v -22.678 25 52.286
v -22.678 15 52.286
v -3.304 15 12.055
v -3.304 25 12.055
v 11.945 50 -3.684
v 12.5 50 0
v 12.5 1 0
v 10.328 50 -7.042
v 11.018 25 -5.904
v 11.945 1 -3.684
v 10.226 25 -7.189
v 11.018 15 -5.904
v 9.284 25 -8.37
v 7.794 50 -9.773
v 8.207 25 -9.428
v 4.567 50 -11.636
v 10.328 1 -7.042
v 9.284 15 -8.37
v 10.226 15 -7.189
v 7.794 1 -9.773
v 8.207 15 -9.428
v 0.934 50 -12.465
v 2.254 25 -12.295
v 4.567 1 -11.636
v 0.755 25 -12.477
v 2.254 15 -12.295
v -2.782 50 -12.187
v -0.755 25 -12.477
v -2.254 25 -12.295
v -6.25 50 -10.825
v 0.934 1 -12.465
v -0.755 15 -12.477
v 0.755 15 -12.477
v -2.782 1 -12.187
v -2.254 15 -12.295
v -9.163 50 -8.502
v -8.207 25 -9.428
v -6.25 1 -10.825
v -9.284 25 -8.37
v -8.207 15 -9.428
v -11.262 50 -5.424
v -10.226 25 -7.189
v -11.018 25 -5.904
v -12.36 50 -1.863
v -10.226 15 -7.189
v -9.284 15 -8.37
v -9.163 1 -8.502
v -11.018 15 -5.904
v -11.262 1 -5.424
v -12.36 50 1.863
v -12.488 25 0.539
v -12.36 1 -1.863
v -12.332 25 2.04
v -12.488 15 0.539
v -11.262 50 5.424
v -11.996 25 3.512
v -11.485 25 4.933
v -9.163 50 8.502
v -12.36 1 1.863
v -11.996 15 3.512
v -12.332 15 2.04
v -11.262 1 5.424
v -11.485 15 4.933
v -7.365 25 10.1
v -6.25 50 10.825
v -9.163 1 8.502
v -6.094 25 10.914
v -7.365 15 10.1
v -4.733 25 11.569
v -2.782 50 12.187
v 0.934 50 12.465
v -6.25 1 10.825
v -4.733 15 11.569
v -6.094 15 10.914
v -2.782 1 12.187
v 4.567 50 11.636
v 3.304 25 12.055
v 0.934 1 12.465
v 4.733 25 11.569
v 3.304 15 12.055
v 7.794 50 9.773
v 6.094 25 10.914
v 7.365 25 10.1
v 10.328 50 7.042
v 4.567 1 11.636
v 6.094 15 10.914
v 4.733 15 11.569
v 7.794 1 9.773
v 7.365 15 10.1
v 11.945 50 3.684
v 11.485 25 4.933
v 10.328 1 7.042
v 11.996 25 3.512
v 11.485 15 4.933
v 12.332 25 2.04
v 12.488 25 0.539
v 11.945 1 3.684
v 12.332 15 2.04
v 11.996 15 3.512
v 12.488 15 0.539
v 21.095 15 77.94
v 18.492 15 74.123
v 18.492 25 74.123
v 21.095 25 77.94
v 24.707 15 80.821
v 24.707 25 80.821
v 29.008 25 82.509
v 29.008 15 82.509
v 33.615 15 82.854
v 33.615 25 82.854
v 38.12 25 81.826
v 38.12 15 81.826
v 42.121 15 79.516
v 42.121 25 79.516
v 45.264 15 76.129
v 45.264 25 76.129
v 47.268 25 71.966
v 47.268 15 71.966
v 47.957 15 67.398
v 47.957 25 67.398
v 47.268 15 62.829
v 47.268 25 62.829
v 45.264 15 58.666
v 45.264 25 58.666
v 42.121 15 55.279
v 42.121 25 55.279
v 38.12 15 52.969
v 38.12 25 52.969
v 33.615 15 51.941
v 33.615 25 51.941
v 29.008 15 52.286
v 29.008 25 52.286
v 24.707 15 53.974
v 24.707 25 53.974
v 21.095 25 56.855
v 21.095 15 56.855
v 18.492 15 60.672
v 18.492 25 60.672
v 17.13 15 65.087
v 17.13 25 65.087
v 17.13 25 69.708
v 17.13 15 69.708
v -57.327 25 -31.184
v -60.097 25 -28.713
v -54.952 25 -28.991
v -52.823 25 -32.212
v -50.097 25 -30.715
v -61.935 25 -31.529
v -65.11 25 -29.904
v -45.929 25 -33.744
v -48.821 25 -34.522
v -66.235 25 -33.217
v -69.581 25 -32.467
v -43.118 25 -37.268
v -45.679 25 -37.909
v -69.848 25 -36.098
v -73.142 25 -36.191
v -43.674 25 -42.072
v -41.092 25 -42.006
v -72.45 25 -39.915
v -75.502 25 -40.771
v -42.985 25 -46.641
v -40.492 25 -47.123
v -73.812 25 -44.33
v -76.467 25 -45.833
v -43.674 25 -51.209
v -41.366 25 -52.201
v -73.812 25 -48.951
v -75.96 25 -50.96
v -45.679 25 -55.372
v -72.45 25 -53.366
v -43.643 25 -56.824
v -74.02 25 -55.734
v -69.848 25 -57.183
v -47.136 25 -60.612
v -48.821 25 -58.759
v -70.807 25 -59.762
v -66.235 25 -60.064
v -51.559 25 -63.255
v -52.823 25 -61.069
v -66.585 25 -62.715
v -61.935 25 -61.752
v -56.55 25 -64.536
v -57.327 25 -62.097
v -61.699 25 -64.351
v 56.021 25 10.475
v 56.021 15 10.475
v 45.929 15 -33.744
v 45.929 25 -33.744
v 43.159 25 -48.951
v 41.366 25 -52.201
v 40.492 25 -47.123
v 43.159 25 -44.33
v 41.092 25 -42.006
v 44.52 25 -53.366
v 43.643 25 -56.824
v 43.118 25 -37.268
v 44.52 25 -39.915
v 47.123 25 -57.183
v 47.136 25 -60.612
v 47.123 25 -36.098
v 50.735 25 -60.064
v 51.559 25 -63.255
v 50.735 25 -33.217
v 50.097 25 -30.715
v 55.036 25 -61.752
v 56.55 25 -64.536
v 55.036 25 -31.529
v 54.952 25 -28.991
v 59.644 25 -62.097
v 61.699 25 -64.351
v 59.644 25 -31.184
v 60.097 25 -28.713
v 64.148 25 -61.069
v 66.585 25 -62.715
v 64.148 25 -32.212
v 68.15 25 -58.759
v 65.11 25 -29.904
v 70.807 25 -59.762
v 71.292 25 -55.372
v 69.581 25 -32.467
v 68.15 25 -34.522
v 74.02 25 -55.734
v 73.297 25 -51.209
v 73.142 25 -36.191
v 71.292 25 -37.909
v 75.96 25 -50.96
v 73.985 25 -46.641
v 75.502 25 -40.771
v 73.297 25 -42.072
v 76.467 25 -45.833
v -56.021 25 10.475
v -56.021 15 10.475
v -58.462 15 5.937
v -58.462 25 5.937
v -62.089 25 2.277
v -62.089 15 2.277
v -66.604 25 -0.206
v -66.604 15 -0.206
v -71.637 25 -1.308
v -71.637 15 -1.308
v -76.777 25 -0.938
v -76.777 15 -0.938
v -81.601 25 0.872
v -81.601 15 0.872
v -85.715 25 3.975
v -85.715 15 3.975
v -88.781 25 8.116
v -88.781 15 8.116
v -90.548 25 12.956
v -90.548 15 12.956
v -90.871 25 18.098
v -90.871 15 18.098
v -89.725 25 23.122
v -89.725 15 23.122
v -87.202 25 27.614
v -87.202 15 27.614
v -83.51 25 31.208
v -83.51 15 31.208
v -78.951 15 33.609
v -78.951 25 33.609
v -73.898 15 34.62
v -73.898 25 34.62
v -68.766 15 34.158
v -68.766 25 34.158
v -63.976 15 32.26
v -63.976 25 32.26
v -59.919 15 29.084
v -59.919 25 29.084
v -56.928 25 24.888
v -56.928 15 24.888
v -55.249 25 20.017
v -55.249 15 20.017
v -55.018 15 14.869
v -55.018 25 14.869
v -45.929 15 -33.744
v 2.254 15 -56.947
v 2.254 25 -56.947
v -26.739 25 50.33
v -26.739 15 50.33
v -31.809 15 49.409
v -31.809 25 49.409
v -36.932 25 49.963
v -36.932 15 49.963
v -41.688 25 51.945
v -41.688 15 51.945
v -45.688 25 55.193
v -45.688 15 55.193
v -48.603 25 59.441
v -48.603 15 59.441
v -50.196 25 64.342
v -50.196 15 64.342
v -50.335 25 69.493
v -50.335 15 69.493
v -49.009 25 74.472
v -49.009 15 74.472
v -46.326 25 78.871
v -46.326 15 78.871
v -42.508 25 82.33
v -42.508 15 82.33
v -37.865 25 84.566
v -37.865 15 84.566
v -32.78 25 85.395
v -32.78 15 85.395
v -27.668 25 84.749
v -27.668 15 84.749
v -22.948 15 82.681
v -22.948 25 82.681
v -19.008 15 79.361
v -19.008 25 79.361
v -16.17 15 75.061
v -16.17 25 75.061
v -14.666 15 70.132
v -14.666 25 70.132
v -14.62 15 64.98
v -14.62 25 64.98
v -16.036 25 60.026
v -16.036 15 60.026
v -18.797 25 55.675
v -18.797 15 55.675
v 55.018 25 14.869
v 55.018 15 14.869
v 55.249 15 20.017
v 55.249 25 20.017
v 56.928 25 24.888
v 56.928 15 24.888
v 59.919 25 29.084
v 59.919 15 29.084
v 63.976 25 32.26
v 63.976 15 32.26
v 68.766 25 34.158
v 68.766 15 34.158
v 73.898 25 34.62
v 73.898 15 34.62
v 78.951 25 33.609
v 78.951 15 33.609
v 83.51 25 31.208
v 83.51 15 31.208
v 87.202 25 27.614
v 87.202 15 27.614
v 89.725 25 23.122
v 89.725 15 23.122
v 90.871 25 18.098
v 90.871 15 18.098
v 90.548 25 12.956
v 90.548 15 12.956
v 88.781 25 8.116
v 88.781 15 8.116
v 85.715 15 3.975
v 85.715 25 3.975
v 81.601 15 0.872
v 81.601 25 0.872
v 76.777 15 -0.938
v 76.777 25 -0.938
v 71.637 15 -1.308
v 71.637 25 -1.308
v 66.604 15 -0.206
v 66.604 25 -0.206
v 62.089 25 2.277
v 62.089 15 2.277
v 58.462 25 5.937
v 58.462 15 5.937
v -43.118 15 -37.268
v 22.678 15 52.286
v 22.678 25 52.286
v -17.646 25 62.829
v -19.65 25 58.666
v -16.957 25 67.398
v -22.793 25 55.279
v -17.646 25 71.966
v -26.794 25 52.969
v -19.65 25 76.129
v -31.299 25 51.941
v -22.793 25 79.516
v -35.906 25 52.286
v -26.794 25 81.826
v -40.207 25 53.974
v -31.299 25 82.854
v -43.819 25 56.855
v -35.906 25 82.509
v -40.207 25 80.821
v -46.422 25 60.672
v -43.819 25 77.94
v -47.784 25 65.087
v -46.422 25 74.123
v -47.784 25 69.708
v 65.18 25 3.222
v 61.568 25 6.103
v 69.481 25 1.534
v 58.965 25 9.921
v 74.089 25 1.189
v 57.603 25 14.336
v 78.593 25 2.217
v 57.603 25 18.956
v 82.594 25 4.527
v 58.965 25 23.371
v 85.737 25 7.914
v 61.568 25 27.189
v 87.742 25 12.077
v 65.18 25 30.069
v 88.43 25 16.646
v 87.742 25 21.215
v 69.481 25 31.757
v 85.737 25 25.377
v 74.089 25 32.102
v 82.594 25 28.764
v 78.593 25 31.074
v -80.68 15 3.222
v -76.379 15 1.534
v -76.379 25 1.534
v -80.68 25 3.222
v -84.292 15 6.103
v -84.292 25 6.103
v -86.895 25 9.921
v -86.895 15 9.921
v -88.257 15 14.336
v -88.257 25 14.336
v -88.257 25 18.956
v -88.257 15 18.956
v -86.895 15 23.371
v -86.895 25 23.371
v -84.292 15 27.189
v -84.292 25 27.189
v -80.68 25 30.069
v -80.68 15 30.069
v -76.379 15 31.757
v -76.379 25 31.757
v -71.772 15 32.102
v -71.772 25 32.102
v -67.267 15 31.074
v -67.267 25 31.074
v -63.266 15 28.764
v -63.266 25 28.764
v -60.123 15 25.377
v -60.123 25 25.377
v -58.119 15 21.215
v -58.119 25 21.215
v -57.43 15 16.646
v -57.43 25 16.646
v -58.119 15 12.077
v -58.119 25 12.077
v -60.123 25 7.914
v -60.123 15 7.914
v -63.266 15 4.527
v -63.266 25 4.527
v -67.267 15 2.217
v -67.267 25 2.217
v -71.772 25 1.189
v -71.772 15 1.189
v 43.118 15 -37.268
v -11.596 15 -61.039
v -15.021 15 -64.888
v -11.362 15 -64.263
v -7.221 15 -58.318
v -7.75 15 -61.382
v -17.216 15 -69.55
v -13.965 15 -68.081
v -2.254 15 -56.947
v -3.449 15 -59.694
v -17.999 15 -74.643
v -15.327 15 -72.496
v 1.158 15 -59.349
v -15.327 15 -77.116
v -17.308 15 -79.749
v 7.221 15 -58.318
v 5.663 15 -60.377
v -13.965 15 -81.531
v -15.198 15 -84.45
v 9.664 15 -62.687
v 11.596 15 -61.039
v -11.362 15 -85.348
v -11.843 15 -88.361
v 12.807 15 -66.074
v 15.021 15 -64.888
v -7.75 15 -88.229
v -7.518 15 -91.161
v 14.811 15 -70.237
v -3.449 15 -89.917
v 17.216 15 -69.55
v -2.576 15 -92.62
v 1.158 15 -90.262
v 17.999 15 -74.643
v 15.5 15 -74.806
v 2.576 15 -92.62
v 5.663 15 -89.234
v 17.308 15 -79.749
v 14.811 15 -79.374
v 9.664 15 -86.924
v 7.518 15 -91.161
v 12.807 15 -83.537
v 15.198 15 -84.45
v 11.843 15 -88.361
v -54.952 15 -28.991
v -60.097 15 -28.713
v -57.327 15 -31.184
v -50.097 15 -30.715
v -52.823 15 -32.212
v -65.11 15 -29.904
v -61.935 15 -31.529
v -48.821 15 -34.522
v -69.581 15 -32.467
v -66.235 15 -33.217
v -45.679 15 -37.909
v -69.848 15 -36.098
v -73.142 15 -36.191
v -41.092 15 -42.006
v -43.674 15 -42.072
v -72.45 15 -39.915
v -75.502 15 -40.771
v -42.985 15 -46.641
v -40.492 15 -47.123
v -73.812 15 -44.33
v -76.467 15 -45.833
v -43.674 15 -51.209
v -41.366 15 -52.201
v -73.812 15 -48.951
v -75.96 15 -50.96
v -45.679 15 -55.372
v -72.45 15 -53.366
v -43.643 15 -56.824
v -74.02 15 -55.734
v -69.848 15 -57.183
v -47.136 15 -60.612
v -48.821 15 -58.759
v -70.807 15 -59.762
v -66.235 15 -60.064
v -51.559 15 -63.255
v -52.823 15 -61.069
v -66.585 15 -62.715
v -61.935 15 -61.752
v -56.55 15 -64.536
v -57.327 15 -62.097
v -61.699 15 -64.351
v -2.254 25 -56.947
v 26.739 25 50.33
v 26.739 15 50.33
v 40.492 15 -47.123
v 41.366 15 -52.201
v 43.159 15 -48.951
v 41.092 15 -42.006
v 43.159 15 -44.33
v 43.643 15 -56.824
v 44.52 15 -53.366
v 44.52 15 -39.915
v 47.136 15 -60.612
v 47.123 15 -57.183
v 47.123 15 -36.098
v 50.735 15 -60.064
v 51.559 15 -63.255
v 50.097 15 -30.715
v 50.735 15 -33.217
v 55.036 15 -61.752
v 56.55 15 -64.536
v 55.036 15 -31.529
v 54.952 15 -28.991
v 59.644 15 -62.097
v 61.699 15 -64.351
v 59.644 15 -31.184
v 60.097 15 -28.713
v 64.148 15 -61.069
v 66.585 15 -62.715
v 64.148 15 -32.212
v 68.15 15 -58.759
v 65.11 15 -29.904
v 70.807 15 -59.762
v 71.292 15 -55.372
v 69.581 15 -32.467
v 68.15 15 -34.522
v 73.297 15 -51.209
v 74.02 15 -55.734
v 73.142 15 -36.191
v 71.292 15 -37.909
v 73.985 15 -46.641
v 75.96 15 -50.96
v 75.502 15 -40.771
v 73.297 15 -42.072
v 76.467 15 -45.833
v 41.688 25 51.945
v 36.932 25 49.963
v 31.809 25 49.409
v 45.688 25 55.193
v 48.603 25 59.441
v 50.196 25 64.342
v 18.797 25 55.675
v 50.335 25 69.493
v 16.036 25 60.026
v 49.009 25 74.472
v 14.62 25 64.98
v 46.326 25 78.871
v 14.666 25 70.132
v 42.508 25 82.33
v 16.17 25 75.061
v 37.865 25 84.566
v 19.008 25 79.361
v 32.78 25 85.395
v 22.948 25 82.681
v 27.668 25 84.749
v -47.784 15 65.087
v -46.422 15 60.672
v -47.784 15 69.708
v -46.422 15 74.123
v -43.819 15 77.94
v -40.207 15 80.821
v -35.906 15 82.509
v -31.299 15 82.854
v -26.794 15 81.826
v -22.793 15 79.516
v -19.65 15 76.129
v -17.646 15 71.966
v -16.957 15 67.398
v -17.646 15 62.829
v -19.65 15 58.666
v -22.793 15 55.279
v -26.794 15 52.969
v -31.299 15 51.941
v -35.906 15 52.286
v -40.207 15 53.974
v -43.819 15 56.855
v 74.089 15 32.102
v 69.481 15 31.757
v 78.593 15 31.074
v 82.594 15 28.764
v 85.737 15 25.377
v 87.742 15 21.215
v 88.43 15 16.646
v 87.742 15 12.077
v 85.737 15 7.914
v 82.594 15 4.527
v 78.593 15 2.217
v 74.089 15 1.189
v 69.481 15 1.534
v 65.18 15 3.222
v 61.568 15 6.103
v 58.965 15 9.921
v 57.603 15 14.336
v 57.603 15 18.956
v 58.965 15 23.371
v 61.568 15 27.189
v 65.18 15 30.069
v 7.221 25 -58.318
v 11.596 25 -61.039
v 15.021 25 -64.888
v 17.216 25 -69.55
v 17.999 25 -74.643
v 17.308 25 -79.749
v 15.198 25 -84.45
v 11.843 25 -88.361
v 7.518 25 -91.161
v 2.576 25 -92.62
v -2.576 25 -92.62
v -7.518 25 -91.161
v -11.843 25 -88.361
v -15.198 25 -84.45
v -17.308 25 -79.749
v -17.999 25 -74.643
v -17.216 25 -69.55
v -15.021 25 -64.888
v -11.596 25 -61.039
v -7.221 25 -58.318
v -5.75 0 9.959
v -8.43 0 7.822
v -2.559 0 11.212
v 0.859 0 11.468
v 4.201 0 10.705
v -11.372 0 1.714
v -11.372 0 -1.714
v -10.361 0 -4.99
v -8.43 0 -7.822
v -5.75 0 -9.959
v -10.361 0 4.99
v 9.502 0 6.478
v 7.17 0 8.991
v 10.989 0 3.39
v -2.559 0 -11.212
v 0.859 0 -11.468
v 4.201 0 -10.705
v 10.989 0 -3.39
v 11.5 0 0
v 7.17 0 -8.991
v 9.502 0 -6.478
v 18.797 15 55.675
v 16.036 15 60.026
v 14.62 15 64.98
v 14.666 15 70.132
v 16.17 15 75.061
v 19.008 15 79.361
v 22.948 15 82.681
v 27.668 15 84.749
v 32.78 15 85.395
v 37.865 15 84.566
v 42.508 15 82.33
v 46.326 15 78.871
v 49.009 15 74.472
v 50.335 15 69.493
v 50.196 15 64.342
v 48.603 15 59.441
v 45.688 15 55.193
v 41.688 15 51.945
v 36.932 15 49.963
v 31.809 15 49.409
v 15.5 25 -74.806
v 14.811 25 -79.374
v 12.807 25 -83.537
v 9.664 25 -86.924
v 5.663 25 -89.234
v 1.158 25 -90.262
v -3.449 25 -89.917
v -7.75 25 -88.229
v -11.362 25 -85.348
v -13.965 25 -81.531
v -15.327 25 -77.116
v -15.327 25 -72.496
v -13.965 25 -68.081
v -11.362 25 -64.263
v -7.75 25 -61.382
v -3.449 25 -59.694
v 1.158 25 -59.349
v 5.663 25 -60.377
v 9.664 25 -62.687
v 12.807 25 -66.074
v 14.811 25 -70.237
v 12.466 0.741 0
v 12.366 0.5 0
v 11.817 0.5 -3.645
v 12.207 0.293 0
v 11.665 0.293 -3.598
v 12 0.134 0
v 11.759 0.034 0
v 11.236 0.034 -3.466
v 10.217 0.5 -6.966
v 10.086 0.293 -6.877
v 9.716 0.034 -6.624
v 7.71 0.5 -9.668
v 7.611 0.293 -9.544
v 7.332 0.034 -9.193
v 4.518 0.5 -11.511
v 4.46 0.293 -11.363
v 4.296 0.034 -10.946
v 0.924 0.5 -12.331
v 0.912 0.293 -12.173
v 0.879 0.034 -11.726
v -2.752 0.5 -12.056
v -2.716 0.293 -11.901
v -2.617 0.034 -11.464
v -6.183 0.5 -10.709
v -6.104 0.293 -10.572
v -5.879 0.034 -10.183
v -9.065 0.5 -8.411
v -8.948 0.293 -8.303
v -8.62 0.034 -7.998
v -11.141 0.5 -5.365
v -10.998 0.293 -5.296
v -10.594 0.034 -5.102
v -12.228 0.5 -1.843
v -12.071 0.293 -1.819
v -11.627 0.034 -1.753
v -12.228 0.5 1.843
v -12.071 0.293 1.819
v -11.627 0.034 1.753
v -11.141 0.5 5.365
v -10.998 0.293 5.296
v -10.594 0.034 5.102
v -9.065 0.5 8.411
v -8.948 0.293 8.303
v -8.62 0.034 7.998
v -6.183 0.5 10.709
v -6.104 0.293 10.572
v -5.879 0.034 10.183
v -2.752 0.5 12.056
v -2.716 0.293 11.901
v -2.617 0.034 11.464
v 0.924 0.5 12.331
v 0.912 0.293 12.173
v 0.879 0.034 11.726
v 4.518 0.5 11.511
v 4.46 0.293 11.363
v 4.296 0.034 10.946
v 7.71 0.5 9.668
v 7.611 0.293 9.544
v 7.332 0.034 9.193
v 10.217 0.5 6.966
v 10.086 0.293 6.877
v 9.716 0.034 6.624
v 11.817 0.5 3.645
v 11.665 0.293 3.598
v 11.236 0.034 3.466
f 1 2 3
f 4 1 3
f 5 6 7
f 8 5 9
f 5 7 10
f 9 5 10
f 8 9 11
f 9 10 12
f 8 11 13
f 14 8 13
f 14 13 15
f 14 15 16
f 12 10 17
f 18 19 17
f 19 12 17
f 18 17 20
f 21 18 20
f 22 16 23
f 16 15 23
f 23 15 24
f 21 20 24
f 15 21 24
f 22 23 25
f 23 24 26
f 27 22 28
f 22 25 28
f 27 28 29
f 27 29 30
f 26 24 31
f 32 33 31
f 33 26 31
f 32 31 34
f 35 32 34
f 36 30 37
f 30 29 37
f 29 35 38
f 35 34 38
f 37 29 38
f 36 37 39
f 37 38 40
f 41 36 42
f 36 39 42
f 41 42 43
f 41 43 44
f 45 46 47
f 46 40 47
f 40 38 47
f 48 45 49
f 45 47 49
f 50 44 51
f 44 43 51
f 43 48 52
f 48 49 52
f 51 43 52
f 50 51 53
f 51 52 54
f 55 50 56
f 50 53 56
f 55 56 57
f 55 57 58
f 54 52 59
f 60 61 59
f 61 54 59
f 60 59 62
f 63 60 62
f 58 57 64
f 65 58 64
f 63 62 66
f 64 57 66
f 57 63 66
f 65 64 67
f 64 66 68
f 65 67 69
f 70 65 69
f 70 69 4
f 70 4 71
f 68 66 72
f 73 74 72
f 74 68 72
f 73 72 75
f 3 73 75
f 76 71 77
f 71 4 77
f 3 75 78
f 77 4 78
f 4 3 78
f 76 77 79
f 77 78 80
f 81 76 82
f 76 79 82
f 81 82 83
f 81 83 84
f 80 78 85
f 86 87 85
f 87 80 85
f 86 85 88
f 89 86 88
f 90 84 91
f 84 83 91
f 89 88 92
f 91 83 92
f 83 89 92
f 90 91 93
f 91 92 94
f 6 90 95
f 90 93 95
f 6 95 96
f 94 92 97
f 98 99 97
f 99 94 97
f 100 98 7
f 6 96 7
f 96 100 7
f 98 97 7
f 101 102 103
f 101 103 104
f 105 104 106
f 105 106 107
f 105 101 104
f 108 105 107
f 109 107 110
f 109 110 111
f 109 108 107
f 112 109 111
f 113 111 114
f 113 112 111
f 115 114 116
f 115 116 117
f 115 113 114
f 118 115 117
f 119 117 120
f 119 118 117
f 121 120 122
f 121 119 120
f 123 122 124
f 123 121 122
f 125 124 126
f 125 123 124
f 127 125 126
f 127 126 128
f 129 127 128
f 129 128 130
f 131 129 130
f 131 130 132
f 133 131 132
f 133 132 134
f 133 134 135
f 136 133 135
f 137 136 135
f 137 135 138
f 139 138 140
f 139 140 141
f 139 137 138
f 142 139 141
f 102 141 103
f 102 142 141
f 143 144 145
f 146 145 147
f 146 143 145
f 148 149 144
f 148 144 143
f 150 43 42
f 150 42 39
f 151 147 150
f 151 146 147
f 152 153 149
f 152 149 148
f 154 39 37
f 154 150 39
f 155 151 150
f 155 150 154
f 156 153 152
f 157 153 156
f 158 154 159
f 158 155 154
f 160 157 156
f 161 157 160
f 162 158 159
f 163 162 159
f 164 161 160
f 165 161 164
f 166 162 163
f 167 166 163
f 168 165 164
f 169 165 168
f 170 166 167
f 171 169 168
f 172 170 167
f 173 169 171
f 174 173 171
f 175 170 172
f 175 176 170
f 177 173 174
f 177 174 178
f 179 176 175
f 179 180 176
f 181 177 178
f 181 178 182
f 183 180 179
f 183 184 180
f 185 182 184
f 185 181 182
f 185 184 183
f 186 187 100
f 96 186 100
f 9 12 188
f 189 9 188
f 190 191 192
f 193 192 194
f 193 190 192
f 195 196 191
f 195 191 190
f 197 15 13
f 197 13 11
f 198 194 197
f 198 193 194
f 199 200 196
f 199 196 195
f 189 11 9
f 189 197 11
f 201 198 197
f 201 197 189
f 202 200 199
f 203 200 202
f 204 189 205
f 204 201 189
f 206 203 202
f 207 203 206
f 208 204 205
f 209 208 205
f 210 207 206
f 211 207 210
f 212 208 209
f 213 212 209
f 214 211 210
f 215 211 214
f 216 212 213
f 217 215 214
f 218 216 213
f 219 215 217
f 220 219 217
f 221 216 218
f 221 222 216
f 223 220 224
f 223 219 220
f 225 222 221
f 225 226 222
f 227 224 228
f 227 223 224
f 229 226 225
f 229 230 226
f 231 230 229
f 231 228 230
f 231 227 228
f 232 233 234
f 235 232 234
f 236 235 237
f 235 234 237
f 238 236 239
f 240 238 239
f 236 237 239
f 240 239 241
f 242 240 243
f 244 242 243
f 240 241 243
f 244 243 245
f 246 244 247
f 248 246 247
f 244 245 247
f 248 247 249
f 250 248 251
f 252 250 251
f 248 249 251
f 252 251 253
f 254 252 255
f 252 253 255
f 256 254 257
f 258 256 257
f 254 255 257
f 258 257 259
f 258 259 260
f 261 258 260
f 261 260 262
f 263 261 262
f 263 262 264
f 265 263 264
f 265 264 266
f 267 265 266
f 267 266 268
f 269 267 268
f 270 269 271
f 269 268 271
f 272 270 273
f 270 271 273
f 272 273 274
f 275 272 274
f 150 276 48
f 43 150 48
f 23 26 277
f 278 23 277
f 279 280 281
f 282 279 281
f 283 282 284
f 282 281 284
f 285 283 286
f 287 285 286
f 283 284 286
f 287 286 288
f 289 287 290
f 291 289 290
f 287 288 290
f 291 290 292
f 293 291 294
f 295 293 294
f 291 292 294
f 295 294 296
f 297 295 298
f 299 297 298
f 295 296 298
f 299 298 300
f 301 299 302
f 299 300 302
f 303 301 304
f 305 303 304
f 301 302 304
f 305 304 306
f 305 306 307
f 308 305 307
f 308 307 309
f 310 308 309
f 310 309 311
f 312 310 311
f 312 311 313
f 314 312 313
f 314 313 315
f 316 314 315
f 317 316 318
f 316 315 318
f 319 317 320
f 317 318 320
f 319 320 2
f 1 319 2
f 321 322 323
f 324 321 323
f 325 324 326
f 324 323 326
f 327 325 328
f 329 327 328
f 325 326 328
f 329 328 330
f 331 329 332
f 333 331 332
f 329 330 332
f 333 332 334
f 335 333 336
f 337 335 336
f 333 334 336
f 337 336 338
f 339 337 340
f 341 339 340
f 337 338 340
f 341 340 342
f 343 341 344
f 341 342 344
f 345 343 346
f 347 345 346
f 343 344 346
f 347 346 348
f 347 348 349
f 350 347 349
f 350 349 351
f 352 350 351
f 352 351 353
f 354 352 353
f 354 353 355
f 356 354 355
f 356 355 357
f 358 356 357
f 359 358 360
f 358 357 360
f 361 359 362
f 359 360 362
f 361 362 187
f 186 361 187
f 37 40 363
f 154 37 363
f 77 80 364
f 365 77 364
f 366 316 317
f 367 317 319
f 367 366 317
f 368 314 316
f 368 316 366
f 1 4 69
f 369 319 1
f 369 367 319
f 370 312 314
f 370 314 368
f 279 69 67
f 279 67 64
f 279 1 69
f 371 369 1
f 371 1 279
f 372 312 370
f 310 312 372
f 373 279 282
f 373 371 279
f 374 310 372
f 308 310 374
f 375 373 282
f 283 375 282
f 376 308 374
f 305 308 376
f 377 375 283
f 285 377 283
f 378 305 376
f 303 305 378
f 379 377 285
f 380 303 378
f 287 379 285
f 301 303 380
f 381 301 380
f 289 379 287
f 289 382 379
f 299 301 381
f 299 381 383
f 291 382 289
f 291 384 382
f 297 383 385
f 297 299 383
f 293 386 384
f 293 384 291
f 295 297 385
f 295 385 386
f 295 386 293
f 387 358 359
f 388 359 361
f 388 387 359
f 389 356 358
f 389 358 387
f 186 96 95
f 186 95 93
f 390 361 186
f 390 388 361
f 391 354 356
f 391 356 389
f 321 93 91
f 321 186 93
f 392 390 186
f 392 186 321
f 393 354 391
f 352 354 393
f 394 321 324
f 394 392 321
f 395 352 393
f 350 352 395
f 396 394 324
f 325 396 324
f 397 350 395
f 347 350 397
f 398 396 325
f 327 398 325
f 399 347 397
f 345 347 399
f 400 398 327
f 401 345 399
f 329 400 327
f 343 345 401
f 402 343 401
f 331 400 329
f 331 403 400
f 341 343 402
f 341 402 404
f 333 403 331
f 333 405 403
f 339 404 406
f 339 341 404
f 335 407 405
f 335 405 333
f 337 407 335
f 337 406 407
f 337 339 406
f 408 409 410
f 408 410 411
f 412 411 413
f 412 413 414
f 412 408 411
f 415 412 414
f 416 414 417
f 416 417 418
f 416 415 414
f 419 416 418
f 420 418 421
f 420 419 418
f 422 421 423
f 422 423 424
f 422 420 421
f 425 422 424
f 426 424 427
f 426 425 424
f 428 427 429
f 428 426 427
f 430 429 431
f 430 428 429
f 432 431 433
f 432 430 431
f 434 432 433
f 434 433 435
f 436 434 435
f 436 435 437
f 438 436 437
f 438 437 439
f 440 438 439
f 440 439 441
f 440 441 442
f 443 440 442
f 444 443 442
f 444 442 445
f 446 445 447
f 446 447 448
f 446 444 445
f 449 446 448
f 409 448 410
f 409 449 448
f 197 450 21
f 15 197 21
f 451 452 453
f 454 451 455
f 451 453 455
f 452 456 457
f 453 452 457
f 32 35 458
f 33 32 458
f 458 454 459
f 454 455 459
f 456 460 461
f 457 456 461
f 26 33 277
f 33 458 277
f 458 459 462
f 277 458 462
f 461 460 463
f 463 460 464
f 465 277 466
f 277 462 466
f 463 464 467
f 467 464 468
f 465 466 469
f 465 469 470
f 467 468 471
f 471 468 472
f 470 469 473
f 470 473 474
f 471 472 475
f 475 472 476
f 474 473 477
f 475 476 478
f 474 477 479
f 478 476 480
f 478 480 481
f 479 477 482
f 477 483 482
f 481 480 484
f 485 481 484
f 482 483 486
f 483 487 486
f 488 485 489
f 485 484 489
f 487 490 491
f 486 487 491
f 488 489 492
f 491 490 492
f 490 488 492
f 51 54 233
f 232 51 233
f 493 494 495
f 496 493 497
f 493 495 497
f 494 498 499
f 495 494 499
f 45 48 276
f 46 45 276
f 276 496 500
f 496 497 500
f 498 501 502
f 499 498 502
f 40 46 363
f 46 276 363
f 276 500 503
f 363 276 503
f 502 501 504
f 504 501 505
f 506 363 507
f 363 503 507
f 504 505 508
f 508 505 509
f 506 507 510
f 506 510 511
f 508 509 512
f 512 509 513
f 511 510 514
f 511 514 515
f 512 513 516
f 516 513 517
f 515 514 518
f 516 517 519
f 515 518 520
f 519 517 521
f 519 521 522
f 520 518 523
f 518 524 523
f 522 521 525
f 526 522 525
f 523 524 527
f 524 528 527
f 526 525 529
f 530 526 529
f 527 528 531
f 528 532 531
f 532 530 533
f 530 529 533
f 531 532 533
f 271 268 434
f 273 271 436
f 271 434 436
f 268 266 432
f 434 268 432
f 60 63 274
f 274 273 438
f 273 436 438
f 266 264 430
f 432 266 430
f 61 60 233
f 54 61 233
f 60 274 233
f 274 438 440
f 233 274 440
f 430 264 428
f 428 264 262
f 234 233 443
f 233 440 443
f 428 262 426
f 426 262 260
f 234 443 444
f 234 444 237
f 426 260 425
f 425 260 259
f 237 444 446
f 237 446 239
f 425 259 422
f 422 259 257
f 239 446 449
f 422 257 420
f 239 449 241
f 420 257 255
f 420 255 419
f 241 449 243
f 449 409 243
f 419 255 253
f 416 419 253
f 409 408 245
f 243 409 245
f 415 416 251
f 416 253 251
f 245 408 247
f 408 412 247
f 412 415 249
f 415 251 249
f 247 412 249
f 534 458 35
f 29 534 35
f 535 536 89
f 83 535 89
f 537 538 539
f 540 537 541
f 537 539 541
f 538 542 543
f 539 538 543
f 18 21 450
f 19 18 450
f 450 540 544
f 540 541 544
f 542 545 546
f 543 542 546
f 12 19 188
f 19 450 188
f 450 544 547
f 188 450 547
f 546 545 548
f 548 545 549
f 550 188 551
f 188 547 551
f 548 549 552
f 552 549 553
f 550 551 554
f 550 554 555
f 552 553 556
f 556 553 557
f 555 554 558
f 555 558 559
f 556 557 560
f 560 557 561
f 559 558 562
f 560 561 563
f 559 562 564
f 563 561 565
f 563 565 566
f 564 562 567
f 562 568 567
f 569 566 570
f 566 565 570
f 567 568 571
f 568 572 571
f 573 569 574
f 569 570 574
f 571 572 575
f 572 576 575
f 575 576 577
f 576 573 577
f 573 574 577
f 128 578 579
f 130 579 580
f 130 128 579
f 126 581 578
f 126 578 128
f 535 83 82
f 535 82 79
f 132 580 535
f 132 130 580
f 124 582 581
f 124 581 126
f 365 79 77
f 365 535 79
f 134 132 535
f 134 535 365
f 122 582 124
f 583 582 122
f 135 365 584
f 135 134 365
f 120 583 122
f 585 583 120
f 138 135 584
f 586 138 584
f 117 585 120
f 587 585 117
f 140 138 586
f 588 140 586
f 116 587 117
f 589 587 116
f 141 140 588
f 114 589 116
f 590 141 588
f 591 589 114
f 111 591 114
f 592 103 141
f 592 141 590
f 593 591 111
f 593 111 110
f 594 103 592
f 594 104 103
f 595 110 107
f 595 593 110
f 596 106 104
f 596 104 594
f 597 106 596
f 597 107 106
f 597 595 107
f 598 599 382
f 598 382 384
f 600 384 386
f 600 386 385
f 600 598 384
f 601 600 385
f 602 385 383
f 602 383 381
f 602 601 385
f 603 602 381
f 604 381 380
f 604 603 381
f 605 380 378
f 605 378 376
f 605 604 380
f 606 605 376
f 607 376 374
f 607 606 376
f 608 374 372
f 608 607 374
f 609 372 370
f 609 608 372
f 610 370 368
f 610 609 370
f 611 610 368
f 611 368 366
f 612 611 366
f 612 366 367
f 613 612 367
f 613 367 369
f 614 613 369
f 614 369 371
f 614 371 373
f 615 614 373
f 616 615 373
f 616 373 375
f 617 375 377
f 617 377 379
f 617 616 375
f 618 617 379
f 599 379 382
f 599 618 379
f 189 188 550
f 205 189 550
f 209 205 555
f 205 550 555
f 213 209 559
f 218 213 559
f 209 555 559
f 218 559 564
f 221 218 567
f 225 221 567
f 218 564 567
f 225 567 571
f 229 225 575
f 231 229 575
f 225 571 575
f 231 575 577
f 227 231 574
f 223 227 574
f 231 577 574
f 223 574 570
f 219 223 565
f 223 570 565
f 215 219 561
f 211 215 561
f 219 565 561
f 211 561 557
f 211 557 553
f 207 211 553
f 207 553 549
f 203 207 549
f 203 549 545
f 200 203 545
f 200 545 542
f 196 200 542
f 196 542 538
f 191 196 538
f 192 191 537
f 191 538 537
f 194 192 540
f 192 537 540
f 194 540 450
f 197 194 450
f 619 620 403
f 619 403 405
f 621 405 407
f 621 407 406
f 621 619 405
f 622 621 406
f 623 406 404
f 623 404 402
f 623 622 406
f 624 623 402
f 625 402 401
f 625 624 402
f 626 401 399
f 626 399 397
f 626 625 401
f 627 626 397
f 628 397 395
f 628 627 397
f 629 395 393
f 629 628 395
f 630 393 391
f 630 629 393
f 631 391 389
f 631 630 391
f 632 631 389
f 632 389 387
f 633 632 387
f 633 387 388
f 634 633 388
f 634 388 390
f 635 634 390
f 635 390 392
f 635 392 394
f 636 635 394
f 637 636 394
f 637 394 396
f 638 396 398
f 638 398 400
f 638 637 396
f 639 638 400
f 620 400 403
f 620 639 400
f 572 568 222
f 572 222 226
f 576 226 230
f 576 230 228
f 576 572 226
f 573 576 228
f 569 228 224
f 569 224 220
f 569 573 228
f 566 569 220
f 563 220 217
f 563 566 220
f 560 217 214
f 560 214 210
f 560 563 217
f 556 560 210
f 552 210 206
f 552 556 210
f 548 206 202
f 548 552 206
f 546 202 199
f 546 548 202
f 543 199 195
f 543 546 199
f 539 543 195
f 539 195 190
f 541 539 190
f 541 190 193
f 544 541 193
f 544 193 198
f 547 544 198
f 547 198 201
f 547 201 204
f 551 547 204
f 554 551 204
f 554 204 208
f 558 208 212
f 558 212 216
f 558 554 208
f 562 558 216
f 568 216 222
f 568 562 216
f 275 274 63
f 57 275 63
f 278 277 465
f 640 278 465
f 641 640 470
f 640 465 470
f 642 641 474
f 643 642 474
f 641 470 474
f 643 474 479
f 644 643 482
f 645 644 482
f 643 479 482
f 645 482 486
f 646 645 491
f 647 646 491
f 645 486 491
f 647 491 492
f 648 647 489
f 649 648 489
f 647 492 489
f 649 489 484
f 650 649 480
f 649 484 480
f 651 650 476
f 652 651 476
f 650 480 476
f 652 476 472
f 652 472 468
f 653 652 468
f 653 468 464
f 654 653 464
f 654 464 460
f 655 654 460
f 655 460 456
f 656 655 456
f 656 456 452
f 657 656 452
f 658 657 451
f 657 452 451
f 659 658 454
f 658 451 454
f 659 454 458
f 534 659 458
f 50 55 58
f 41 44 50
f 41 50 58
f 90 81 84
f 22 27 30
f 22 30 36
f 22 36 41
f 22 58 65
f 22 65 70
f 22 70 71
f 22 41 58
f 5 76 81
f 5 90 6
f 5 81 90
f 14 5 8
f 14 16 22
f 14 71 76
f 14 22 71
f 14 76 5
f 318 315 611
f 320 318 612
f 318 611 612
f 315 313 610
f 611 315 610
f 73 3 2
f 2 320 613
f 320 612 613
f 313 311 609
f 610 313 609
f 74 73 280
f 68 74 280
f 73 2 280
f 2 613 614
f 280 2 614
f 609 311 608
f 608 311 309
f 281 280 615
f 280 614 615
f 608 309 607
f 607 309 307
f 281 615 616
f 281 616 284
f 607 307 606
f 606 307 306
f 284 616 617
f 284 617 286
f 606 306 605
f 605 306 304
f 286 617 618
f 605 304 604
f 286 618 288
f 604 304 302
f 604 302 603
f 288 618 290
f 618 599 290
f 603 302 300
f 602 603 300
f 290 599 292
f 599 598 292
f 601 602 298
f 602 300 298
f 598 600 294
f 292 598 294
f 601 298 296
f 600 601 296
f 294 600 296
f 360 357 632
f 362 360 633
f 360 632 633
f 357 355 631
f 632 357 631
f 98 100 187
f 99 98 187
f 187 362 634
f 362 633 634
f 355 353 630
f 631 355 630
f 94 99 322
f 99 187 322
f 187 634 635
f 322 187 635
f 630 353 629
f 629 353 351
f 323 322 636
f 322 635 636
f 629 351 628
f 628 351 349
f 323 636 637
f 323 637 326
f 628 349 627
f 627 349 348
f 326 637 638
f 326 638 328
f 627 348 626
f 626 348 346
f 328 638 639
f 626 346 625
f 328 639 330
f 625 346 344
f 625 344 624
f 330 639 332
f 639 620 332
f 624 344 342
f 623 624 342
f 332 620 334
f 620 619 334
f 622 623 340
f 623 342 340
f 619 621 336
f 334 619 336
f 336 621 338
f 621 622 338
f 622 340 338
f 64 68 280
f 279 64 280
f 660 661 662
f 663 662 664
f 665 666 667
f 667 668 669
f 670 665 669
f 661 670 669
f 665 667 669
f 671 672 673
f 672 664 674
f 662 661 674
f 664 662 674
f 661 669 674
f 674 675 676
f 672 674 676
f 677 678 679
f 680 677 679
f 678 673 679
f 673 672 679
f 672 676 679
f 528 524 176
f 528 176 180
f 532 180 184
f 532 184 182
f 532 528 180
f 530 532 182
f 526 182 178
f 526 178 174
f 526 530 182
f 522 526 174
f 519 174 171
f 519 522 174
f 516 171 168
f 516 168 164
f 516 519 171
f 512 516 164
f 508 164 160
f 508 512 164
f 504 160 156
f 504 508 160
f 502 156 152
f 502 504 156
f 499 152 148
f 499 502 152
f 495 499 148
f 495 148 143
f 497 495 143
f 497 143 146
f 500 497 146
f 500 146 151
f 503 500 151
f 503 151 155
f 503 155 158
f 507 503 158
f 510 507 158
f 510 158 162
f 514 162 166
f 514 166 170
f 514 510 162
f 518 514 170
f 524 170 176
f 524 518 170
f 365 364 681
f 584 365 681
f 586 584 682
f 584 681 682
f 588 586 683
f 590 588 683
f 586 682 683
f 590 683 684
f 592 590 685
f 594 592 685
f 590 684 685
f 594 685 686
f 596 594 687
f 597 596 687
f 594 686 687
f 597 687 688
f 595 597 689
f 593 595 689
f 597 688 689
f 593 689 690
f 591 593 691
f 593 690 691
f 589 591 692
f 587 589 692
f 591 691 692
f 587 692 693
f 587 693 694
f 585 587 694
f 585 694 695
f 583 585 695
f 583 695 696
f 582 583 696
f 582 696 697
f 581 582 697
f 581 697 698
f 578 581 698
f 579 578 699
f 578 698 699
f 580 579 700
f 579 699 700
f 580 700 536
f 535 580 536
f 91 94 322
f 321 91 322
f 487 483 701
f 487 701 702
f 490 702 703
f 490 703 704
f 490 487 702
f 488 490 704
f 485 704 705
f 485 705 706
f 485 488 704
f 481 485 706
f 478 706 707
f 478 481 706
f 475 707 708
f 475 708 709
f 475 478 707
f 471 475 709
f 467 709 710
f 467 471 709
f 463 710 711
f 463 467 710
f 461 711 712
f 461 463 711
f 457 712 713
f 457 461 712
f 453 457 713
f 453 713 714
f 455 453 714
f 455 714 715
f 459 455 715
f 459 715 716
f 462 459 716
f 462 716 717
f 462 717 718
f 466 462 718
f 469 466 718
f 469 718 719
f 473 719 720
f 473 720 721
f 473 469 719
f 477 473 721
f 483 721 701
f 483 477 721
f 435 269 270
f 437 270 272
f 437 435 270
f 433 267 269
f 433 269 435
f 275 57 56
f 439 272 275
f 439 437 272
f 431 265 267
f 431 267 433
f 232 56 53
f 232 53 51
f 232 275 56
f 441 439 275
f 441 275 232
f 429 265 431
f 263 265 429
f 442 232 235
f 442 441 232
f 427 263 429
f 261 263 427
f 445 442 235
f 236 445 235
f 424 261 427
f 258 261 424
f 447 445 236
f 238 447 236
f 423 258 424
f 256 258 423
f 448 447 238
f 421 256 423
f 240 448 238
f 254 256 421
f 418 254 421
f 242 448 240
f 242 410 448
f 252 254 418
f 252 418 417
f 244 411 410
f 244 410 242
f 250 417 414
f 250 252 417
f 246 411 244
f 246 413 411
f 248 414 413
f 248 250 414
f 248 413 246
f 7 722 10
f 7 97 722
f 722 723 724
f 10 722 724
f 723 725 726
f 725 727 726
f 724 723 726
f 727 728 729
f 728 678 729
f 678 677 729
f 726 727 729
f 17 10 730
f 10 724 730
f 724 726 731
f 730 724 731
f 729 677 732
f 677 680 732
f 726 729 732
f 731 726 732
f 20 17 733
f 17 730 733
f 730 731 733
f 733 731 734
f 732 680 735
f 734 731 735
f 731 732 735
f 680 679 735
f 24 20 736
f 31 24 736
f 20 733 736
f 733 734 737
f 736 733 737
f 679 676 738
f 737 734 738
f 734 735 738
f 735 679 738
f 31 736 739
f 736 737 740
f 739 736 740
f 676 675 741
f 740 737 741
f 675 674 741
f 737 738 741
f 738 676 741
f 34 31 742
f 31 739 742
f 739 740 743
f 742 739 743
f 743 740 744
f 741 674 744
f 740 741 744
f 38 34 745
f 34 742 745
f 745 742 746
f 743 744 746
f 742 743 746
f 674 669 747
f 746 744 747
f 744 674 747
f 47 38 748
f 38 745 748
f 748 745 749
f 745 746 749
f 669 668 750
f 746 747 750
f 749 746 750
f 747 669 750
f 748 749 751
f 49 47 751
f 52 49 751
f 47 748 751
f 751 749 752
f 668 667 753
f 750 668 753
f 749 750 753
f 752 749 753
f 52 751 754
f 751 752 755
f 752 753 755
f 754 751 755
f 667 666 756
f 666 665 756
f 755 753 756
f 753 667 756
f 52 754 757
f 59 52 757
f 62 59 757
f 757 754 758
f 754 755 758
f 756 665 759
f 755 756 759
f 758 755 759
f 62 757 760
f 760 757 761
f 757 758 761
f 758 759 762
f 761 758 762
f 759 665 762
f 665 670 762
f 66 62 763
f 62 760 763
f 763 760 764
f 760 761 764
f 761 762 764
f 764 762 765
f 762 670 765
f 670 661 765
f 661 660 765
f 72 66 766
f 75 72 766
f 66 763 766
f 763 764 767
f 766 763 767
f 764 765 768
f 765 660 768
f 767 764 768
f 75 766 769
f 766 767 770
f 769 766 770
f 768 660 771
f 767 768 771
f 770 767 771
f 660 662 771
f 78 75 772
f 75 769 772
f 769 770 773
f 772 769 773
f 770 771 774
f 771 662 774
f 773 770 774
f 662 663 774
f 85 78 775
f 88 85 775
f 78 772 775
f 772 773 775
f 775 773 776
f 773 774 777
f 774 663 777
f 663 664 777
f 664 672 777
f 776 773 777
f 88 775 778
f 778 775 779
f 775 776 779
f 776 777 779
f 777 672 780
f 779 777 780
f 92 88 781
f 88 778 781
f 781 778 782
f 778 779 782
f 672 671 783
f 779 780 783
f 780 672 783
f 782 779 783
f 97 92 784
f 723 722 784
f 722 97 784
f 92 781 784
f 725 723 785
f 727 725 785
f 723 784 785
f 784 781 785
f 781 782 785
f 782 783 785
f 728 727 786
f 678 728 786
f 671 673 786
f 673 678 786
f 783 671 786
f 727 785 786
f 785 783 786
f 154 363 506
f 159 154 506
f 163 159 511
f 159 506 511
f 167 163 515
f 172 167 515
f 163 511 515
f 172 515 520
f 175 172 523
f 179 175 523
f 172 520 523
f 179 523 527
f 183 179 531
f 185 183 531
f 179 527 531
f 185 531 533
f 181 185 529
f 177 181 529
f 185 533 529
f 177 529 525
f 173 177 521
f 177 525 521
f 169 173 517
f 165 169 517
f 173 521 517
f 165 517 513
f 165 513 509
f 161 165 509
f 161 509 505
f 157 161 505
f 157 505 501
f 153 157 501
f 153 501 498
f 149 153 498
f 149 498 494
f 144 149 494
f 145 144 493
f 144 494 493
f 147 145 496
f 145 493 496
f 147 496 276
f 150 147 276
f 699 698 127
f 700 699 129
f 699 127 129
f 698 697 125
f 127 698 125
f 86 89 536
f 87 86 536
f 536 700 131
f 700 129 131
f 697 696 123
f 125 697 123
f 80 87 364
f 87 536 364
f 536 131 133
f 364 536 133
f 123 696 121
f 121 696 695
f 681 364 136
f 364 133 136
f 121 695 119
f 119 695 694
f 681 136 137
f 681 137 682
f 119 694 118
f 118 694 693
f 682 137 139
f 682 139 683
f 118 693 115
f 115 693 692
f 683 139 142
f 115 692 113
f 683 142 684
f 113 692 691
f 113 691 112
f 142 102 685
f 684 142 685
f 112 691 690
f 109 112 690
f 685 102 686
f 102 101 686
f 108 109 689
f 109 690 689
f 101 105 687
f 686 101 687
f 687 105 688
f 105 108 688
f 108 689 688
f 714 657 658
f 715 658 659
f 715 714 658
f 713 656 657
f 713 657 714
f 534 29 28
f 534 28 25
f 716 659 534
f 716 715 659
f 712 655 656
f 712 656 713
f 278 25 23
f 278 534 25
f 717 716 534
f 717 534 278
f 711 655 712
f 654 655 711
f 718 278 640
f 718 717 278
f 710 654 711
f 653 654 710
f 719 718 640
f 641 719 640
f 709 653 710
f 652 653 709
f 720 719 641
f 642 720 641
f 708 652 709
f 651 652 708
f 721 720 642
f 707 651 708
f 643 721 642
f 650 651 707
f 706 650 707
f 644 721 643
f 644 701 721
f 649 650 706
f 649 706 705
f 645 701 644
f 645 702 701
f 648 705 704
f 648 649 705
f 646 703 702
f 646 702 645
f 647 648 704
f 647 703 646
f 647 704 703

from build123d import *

# Parameters (mm, degrees)
SKETCH1_R           = 12.5
BOSS_EXTRUDE1_DEPTH = 50
BOSS_EXTRUDE2_START = 15
SKETCH3_R           = 15.5
BOSS_EXTRUDE2_DEPTH = 10
CIRPATTERN1_COUNT   = 7
FILLET1_R           = 1


with BuildPart() as part:
    # Sketch1 → Boss-Extrude1 (new body)
    with BuildSketch(Plane(origin=(0, 0, 0), x_dir=(1, 0, 0), z_dir=(0, 1, 0))):
        Circle(SKETCH1_R)
    extrude(amount=BOSS_EXTRUDE1_DEPTH)

    # Sketch3 → Boss-Extrude2 (add)
    with BuildSketch(Plane(origin=(0, 0, 0), x_dir=(1, 0, 0), z_dir=(0, 1, 0)).offset(BOSS_EXTRUDE2_START)):
        with BuildLine():
            Line((-2.253835774, 56.947383215), (-2.253835774, 12.295130105))
            Line((-2.253835774, 12.295130105), (2.253835774, 12.295130105))
            Line((2.253835774, 12.295130105), (2.253835774, 56.947383215))
            ThreePointArc((2.253835774, 56.947383215), (0, 92.805720885), (-2.253835774, 56.947383215))
        make_face()
        with Locations((0, 74.805720885)):
            Circle(SKETCH3_R, mode=Mode.SUBTRACT)
    boss_extrude2 = extrude(amount=BOSS_EXTRUDE2_DEPTH)

    # CirPattern1: Boss-Extrude2 ×7 about axis
    cirpattern1_axis = Axis((0, 0, 0), (0, 1, 0))
    for i in range(1, CIRPATTERN1_COUNT):
        add(boss_extrude2.rotate(cirpattern1_axis, i * 360 / CIRPATTERN1_COUNT))

    # Fillet1
    fillet1_edges = [part.edges().sort_by_distance(p)[0] for p in [
        (-12.5, 0, 0),
    ]]
    fillet(fillet1_edges, radius=FILLET1_R)


solid = part.part
